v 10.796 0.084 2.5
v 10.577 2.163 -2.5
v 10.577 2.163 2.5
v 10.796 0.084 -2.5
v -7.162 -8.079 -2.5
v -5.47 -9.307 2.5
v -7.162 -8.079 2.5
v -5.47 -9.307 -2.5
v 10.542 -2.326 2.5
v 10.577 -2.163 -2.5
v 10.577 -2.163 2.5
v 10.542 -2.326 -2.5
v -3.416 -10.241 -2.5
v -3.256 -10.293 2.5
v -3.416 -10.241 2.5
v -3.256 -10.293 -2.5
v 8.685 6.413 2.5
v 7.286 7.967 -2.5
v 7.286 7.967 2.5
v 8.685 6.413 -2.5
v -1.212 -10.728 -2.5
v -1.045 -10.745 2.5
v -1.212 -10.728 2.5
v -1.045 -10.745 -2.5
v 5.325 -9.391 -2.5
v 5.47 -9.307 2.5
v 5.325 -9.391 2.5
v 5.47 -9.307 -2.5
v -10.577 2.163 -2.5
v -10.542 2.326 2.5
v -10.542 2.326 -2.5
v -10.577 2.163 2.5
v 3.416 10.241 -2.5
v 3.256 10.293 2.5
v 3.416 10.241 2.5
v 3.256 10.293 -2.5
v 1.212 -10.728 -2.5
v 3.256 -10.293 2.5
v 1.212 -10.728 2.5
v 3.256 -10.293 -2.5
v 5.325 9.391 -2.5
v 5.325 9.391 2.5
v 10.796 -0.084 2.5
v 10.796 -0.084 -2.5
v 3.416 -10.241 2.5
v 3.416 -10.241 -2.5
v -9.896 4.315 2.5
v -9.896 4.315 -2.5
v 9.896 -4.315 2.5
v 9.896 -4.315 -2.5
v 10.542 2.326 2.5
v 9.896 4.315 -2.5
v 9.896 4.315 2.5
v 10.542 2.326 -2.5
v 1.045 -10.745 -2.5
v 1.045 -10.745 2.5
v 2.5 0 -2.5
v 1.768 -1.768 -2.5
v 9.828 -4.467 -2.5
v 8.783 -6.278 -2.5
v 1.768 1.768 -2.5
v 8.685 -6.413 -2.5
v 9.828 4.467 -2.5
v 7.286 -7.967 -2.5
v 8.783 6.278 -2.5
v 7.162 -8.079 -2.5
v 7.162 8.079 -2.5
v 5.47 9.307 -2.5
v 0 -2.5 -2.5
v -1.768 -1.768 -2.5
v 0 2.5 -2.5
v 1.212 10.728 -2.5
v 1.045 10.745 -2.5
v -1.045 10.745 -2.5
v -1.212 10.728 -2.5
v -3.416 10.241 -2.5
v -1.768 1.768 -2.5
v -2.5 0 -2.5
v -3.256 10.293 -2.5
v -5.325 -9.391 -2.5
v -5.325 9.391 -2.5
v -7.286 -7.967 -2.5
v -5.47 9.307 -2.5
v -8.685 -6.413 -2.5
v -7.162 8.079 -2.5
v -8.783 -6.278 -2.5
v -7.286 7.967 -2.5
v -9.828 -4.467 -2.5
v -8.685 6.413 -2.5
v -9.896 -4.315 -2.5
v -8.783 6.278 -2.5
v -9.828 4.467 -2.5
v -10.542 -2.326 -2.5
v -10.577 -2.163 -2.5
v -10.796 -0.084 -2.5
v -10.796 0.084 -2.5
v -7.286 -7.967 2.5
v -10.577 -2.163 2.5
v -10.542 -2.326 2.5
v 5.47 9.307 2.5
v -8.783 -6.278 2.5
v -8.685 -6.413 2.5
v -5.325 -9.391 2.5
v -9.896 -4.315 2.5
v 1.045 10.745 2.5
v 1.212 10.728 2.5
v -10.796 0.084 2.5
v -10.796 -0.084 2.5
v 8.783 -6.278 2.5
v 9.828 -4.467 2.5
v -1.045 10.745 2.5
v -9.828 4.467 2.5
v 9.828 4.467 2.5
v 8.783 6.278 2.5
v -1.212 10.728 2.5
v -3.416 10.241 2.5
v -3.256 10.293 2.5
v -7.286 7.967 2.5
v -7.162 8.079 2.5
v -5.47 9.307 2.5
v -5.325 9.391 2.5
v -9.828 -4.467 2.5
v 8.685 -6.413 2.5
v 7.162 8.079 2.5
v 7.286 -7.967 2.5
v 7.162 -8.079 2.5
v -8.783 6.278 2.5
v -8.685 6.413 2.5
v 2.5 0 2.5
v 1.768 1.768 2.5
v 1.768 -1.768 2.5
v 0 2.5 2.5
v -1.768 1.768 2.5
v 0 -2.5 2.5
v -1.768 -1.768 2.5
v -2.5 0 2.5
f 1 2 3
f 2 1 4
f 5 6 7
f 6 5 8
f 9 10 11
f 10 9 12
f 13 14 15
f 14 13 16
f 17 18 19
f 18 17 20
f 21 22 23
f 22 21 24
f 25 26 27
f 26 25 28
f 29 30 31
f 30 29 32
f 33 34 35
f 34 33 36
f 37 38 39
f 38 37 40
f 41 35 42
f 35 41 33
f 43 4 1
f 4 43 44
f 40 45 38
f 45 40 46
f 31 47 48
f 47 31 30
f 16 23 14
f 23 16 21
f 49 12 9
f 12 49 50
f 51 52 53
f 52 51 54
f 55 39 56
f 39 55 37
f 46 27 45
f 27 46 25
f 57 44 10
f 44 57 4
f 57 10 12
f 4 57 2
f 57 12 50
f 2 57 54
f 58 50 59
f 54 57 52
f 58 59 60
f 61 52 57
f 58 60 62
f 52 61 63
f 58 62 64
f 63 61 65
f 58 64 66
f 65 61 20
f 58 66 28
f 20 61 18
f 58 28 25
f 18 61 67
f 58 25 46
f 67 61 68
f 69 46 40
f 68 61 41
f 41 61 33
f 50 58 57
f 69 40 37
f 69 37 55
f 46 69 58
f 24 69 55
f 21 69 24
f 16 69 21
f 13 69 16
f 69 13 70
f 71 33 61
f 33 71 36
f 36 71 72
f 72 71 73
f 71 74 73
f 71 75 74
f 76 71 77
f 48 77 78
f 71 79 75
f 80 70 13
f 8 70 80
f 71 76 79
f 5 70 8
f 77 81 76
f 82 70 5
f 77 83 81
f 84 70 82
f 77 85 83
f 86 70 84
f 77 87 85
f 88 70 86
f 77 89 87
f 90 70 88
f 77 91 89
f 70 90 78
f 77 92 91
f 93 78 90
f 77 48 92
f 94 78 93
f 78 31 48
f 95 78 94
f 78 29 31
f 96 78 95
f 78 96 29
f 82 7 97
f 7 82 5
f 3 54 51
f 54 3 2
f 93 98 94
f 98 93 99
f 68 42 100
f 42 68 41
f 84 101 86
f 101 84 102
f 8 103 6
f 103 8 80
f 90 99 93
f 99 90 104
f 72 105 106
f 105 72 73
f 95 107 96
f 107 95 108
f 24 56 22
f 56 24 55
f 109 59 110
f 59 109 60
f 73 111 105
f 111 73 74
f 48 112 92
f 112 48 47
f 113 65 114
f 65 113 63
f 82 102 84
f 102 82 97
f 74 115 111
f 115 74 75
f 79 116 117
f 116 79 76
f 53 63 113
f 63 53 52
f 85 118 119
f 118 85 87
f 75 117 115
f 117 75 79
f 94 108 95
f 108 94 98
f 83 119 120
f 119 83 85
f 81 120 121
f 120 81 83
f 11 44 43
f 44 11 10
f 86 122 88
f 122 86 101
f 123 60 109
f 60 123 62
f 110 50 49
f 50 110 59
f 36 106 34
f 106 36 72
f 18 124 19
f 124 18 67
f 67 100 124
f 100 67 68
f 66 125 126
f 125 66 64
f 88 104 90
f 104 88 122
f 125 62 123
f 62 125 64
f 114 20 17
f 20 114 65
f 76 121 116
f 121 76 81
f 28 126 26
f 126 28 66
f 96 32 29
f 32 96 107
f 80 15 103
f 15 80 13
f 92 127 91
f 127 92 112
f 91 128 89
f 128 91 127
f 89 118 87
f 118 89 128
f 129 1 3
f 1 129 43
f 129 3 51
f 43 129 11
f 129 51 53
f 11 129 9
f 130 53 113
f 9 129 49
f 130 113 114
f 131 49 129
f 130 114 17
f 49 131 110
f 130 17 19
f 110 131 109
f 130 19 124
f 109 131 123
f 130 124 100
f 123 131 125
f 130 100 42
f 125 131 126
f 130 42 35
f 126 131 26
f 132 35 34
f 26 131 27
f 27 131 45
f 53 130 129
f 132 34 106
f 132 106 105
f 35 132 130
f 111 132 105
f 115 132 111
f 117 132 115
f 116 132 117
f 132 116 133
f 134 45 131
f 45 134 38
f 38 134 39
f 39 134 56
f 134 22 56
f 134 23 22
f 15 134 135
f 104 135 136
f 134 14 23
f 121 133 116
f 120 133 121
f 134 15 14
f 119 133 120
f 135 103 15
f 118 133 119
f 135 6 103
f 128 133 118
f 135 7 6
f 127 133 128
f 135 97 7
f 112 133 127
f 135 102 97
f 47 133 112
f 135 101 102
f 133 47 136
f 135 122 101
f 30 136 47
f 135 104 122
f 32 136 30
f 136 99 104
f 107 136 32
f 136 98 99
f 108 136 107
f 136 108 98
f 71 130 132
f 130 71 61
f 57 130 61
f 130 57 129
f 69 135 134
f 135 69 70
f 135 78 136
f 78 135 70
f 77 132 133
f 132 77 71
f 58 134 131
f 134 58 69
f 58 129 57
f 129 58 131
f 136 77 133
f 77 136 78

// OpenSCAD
// Parameters
magnet_type = 0; //[0:10:1]
magnet_od = 20; //[10:40:1]
magnet_id = 5; //[0:20:1]
magnet_h = 5; //[2.5:10:0.5]
magnet_edge_r = 0.8; //[0:2:0.1]
eps = 0.6; //[0.2:2:0.1]

// Magnet - complete geometry
module magnet() {
  color([0.72, 0.45, 0.2]) { // Copper-like color for magnet
    difference() {
      // Outer profile with edge rounding
      linear_extrude(height=magnet_h, center=true) 
        offset(r=magnet_edge_r) 
        circle(r=magnet_od/2);
      
      // Inner bore
      if (magnet_id > 0) {
        linear_extrude(height=magnet_h + eps, center=true)
          circle(r=magnet_id/2);
      }
    }
  }
}

// Assembly
module assembly() {
  magnet();
}

assembly();
